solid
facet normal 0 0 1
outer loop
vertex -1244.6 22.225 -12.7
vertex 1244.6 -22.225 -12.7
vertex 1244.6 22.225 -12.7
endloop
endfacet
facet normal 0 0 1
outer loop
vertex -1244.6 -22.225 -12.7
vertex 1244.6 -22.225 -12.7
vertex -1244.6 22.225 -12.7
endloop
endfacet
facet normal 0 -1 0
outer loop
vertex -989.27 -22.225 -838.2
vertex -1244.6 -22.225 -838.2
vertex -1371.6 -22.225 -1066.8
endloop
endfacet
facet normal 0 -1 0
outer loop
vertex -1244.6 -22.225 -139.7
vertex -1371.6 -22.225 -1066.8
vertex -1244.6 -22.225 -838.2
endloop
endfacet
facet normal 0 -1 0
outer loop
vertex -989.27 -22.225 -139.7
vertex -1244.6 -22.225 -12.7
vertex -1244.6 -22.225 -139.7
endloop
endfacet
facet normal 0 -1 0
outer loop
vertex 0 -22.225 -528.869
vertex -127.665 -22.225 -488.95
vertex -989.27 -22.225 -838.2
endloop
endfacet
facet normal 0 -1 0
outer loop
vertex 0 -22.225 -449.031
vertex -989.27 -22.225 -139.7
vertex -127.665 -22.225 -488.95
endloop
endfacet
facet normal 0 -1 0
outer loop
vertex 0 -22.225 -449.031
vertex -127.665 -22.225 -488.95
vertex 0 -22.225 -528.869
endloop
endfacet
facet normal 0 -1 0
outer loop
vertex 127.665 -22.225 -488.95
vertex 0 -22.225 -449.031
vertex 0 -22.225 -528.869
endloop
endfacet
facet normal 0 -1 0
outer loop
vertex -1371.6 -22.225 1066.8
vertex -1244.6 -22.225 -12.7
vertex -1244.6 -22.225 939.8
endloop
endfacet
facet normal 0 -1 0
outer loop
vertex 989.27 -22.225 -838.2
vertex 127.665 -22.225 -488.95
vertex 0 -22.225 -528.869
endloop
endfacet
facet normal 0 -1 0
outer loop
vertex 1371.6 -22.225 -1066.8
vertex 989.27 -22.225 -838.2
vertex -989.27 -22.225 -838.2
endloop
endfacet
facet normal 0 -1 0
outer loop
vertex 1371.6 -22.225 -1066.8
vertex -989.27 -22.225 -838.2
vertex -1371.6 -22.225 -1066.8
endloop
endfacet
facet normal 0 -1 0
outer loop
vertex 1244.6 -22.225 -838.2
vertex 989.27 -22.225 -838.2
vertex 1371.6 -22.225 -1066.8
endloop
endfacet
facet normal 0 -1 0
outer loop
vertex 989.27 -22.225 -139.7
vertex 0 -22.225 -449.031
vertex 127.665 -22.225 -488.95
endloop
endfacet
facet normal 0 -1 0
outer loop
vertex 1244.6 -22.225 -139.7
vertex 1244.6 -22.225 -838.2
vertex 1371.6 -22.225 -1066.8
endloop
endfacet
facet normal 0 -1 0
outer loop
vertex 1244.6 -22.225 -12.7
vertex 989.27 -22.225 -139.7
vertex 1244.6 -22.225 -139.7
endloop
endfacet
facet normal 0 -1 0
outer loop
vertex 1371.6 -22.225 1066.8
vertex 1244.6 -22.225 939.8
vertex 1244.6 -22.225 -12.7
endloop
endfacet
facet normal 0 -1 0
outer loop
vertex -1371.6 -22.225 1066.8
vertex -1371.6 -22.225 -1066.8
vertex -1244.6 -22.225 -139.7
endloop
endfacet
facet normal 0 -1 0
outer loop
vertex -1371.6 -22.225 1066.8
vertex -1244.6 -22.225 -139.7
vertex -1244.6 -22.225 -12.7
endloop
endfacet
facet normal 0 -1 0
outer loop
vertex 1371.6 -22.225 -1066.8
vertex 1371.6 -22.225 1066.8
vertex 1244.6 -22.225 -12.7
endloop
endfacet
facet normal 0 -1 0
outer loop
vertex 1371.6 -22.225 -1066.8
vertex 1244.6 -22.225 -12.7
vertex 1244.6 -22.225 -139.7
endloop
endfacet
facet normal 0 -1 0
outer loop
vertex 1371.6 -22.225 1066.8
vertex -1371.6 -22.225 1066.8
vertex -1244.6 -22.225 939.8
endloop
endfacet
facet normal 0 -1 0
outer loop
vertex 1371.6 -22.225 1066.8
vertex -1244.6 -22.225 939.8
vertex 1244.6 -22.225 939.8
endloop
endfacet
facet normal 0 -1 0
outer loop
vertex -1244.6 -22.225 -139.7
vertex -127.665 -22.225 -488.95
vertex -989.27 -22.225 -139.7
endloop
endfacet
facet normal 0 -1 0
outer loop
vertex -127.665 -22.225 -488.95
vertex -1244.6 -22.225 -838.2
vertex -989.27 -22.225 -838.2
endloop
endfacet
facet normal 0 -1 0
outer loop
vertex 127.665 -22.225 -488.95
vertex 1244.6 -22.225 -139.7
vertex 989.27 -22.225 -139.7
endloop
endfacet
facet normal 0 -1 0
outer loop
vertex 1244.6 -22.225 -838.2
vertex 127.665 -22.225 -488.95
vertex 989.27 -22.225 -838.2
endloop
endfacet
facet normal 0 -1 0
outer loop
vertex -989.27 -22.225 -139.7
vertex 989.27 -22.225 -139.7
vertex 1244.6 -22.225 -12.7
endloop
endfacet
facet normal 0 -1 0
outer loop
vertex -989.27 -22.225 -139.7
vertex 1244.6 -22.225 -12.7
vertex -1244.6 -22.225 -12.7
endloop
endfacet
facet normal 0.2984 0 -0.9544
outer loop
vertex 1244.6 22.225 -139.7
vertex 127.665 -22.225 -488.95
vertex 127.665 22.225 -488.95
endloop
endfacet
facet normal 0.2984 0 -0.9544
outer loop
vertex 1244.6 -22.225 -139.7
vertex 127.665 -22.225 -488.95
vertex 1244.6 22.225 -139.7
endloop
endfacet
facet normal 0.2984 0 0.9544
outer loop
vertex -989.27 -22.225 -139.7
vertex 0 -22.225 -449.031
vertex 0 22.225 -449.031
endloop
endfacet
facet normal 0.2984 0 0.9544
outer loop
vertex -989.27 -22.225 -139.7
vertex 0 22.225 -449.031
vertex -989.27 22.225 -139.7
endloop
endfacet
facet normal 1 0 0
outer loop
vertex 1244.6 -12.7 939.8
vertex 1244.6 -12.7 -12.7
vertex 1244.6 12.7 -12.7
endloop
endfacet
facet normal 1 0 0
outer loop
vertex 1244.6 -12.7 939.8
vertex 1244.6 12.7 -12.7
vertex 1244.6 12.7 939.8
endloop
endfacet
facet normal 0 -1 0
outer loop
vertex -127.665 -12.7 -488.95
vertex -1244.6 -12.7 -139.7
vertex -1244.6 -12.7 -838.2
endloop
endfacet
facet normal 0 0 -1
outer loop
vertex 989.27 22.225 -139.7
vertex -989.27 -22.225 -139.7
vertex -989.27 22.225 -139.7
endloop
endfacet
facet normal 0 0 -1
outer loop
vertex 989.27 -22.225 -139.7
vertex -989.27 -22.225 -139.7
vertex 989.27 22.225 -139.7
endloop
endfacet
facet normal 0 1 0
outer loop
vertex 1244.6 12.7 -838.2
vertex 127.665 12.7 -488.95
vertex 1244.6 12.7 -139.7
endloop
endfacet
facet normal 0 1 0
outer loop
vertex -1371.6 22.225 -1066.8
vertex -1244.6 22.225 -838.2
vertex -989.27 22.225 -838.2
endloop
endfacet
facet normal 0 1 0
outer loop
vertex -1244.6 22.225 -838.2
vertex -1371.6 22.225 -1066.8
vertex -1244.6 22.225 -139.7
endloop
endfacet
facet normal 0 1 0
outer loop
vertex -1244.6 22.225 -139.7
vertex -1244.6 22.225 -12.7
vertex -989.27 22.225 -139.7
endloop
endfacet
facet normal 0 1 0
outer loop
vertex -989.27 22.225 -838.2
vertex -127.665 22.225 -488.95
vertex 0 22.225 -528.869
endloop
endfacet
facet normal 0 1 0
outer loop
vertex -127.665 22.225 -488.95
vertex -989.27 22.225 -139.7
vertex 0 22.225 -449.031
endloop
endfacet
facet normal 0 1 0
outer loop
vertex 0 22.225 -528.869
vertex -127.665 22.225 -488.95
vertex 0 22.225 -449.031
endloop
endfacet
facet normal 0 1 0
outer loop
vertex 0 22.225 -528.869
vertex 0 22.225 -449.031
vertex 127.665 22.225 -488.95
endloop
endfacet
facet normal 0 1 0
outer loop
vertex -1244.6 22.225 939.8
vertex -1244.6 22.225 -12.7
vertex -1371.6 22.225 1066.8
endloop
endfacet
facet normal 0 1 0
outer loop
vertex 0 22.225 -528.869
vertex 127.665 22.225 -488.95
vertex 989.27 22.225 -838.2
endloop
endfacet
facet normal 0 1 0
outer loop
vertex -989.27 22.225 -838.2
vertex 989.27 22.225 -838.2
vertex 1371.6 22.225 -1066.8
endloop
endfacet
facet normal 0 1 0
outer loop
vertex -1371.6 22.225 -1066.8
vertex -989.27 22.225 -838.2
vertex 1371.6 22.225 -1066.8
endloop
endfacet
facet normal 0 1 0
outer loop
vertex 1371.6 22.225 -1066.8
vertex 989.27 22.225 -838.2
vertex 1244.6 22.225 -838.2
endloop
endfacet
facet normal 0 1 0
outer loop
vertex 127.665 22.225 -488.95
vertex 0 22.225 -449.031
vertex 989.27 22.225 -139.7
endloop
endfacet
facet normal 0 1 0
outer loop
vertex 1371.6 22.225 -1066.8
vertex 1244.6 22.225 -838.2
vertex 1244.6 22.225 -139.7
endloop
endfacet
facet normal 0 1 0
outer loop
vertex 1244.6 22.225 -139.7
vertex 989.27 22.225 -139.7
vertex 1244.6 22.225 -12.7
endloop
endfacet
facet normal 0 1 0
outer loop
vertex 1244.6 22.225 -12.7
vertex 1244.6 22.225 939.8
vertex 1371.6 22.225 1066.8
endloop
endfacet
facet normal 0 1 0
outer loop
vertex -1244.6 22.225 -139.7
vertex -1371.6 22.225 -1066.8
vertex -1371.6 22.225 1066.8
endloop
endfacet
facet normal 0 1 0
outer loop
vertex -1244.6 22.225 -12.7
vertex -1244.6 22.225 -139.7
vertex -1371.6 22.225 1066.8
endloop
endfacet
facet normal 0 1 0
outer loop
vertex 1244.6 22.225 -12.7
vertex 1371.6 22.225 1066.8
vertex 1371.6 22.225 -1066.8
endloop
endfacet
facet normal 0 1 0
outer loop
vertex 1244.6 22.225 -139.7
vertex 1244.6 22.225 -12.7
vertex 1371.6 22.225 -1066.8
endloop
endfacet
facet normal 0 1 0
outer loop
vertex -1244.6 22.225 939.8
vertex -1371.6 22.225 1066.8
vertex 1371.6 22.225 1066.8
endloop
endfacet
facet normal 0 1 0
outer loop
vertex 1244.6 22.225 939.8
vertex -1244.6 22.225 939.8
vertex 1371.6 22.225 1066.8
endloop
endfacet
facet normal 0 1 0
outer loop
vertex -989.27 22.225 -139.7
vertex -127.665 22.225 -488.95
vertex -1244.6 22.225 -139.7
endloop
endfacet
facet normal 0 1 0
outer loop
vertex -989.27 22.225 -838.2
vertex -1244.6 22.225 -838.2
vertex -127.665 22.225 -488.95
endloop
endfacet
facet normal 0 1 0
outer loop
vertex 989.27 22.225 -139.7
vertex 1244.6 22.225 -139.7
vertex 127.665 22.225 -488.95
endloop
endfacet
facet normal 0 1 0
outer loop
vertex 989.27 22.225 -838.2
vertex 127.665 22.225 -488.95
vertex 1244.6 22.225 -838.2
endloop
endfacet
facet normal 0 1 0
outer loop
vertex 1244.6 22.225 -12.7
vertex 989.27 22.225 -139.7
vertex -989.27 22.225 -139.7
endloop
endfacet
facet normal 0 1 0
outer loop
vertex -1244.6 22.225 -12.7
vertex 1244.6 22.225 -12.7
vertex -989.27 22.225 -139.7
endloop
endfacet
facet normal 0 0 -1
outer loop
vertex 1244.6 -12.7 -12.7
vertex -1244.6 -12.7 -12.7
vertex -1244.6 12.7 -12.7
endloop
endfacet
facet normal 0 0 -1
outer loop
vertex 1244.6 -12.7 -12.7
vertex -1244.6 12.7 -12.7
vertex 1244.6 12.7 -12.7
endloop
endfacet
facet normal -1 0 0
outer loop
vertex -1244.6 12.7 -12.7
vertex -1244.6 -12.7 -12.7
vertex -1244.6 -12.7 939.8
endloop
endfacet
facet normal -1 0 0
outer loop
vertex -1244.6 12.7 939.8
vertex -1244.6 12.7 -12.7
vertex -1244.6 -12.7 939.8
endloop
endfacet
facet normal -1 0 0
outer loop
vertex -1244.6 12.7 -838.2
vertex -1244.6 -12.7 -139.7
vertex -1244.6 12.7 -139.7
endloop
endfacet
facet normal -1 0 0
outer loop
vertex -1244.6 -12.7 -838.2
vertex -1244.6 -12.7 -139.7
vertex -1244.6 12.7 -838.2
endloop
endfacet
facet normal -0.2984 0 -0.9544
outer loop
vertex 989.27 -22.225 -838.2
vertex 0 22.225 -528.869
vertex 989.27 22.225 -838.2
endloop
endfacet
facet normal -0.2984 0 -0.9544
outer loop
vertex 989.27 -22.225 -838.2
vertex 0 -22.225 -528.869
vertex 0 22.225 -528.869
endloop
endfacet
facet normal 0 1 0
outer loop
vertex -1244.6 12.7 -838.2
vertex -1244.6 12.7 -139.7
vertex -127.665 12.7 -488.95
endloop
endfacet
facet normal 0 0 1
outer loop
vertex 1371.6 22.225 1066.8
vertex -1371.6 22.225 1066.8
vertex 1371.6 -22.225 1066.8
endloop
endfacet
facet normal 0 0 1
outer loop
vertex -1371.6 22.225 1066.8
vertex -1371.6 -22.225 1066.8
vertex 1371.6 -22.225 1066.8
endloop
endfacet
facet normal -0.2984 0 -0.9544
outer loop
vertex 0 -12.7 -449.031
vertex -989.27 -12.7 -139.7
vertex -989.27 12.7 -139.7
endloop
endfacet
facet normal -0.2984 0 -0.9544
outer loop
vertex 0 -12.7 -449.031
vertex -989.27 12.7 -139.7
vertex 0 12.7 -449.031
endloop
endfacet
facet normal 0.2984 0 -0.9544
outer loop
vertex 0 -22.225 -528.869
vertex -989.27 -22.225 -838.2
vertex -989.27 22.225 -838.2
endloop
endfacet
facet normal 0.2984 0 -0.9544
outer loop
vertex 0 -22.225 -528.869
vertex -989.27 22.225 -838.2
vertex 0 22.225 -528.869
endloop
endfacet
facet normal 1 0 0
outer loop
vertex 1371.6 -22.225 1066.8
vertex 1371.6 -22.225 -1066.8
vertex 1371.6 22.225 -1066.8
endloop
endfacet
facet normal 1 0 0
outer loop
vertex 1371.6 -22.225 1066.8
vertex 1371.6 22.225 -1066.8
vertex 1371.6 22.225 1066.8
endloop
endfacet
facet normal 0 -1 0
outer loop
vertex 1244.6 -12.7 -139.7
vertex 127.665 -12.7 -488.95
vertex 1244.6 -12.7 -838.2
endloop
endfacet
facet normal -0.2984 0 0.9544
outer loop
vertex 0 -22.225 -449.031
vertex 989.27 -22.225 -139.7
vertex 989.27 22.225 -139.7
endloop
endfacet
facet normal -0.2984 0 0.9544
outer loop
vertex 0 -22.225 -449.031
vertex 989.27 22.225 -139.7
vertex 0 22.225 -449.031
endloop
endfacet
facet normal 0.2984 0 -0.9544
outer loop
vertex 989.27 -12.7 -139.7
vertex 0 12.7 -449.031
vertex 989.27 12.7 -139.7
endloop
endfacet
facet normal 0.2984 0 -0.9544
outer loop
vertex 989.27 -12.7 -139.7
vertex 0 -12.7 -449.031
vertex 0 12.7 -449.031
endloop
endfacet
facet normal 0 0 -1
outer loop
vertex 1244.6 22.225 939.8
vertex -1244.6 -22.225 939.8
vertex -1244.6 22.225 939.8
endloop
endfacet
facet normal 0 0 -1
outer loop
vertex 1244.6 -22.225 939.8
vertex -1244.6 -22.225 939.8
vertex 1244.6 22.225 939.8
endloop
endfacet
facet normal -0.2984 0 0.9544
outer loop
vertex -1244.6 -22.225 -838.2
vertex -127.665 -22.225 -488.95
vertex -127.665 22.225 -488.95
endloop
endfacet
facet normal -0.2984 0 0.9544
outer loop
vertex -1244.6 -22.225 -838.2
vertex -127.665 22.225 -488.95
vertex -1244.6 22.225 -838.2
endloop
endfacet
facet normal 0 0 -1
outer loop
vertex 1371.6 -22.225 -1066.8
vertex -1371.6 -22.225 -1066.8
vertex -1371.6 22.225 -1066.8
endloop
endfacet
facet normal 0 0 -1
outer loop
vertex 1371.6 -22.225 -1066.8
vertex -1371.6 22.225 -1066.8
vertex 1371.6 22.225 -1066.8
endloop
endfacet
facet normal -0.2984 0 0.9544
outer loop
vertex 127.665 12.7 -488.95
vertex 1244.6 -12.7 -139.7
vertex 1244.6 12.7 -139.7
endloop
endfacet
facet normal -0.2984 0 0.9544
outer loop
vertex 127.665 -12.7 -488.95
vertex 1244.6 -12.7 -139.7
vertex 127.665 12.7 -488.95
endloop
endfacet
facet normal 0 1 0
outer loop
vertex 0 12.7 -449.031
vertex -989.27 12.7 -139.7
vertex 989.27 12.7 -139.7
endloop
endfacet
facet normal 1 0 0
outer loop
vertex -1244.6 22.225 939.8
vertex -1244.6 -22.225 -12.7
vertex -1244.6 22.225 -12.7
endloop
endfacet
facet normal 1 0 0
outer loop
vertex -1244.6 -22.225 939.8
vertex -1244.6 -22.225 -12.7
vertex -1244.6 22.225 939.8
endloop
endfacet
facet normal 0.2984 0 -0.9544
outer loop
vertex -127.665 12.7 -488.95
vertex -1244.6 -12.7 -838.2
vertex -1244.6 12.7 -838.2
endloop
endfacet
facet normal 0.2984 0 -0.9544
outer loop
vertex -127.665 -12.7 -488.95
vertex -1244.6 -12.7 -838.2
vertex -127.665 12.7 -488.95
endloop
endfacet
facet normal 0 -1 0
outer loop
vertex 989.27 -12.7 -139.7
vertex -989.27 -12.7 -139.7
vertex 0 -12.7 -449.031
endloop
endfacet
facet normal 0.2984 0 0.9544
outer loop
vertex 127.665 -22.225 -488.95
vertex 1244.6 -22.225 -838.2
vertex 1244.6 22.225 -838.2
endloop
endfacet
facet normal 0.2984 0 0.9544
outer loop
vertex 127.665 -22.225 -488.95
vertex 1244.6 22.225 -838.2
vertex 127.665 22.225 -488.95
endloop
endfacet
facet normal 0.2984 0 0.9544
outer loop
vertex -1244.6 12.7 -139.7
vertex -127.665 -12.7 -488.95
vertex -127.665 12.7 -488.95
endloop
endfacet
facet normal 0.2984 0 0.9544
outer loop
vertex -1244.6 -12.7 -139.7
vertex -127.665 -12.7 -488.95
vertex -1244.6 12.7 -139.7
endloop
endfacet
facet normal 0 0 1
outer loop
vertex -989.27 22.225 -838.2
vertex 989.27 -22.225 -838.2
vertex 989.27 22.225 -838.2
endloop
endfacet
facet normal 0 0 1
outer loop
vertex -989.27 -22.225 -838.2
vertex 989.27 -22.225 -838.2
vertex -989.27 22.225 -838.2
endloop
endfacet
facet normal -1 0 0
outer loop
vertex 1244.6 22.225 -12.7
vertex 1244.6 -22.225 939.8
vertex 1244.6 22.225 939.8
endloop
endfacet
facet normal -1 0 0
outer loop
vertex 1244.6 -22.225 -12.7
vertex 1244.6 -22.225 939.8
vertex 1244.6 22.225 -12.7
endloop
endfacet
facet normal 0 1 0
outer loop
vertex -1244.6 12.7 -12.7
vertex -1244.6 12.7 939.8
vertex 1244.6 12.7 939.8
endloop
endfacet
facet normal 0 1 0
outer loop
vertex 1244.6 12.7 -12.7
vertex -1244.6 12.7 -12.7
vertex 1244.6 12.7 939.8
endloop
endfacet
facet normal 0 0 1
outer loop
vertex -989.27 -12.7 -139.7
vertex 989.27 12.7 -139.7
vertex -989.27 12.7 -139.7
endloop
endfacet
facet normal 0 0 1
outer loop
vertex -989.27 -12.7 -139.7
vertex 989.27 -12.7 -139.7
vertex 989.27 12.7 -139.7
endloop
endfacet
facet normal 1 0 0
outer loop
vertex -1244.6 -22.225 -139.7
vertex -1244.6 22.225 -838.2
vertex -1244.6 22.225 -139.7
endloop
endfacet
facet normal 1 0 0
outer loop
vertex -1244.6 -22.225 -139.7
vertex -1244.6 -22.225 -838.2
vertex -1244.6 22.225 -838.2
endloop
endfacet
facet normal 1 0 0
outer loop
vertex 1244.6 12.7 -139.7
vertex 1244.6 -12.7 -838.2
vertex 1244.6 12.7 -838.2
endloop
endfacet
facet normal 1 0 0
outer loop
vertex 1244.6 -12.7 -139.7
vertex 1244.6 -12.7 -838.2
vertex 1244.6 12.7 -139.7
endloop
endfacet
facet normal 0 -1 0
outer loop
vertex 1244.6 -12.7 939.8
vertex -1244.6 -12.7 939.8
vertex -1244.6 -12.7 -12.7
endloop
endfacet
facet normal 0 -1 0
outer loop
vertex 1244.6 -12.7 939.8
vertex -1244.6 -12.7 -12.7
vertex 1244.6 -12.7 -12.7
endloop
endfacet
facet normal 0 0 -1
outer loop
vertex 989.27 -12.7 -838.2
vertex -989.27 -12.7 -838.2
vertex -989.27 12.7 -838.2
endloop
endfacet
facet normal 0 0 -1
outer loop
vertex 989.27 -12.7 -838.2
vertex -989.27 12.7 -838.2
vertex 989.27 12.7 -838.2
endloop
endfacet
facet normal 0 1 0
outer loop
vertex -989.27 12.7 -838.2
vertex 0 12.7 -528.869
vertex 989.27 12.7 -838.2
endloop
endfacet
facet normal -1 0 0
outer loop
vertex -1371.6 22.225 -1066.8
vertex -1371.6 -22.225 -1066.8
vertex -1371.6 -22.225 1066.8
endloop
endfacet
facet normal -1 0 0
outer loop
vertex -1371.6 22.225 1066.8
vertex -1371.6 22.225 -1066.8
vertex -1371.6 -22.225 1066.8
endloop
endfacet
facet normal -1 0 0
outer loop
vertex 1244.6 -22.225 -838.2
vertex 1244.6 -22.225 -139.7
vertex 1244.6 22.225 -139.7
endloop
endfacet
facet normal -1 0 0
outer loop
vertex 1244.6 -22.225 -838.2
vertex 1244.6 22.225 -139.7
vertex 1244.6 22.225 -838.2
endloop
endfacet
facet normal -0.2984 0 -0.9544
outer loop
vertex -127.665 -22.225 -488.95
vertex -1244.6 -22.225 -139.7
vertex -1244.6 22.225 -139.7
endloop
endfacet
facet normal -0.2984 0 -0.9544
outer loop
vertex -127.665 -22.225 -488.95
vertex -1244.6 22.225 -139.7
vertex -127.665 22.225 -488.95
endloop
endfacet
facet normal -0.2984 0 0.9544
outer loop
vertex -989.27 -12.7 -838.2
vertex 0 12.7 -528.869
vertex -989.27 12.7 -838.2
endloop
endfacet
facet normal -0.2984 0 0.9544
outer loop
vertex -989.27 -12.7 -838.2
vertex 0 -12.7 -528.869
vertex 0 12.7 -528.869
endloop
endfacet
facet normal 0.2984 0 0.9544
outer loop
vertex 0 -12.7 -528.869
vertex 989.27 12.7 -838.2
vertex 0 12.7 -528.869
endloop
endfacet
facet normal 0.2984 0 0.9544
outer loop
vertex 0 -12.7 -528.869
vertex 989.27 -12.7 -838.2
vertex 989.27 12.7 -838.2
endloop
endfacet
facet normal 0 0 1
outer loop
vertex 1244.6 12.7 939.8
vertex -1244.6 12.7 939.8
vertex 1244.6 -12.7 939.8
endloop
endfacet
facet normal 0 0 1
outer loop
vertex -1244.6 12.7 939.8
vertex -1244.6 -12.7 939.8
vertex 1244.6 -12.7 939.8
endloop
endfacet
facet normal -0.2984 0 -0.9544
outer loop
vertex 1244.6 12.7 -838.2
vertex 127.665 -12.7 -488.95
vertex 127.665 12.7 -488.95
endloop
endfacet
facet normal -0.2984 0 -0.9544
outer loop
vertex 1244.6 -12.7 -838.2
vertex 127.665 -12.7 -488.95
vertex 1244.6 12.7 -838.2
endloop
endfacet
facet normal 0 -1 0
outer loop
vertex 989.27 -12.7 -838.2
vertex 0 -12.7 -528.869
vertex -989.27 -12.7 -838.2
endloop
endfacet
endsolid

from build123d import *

# Parameters (mm, degrees)
F0_W     = 2743.2
F0_H     = 2133.6
F1_DEPTH = 22.225
F0_W_2   = 2489.2
F0_H_2   = 952.5
F2_DEPTH = 12.7


with BuildPart() as f1:
    # F0 (on Front) → F1 (new body, symmetric)
    with BuildSketch(Plane.XZ):
        Rectangle(F0_W, F0_H)
        Polygon((-1244.6, -12.7), (-1244.6, 939.8), (1244.6, 939.8), (1244.6, -12.7), (1244.6, -139.7), (1244.6, -838.2), (989.2695746648, -838.2), (-989.2695746648, -838.2), (-1244.6, -838.2), (-1244.6, -139.7), align=None, mode=Mode.SUBTRACT)
        Polygon((1244.6, -12.7), (-1244.6, -12.7), (-1244.6, -139.7), (-989.2695746648, -139.7), (989.2695746648, -139.7), (1244.6, -139.7), align=None)
        Polygon((127.6652126676, -488.95), (1244.6, -139.7), (989.2695746648, -139.7), (0, -449.0308605571), align=None)
        Polygon((0, -449.0308605571), (-127.6652126676, -488.95), (0, -528.8691394429), (127.6652126676, -488.95), align=None)
        Polygon((-989.2695746648, -139.7), (-1244.6, -139.7), (-127.6652126676, -488.95), (0, -449.0308605571), align=None)
        Polygon((989.2695746648, -838.2), (1244.6, -838.2), (127.6652126676, -488.95), (0, -528.8691394429), align=None)
        Polygon((-127.6652126676, -488.95), (-1244.6, -838.2), (-989.2695746648, -838.2), (0, -528.8691394429), align=None)
    extrude(amount=F1_DEPTH, both=True)


with BuildPart() as f2:
    # F0 (on Front) → F2 (new body, symmetric)
    with BuildSketch(Plane.XZ):
        with Locations((0, 463.55)):
            Rectangle(F0_W_2, F0_H_2)
    extrude(amount=F2_DEPTH, both=True)


with BuildPart() as f2b:
    # F0 (on Front) → F2, piece 2 (new body, symmetric)
    with BuildSketch(Plane.XZ):
        Polygon((989.2695746648, -139.7), (-989.2695746648, -139.7), (0, -449.0308605571), align=None)
    extrude(amount=F2_DEPTH, both=True)


with BuildPart() as f2c:
    # F0 (on Front) → F2, piece 3 (new body, symmetric)
    with BuildSketch(Plane.XZ):
        Polygon((1244.6, -838.2), (1244.6, -139.7), (127.6652126676, -488.95), align=None)
    extrude(amount=F2_DEPTH, both=True)


with BuildPart() as f2d:
    # F0 (on Front) → F2, piece 4 (new body, symmetric)
    with BuildSketch(Plane.XZ):
        Polygon((0, -528.8691394429), (-989.2695746648, -838.2), (989.2695746648, -838.2), align=None)
    extrude(amount=F2_DEPTH, both=True)


with BuildPart() as f2e:
    # F0 (on Front) → F2, piece 5 (new body, symmetric)
    with BuildSketch(Plane.XZ):
        Polygon((-127.6652126676, -488.95), (-1244.6, -139.7), (-1244.6, -838.2), align=None)
    extrude(amount=F2_DEPTH, both=True)


solid = Compound([f1.part, f2.part, f2b.part, f2c.part, f2d.part, f2e.part])
